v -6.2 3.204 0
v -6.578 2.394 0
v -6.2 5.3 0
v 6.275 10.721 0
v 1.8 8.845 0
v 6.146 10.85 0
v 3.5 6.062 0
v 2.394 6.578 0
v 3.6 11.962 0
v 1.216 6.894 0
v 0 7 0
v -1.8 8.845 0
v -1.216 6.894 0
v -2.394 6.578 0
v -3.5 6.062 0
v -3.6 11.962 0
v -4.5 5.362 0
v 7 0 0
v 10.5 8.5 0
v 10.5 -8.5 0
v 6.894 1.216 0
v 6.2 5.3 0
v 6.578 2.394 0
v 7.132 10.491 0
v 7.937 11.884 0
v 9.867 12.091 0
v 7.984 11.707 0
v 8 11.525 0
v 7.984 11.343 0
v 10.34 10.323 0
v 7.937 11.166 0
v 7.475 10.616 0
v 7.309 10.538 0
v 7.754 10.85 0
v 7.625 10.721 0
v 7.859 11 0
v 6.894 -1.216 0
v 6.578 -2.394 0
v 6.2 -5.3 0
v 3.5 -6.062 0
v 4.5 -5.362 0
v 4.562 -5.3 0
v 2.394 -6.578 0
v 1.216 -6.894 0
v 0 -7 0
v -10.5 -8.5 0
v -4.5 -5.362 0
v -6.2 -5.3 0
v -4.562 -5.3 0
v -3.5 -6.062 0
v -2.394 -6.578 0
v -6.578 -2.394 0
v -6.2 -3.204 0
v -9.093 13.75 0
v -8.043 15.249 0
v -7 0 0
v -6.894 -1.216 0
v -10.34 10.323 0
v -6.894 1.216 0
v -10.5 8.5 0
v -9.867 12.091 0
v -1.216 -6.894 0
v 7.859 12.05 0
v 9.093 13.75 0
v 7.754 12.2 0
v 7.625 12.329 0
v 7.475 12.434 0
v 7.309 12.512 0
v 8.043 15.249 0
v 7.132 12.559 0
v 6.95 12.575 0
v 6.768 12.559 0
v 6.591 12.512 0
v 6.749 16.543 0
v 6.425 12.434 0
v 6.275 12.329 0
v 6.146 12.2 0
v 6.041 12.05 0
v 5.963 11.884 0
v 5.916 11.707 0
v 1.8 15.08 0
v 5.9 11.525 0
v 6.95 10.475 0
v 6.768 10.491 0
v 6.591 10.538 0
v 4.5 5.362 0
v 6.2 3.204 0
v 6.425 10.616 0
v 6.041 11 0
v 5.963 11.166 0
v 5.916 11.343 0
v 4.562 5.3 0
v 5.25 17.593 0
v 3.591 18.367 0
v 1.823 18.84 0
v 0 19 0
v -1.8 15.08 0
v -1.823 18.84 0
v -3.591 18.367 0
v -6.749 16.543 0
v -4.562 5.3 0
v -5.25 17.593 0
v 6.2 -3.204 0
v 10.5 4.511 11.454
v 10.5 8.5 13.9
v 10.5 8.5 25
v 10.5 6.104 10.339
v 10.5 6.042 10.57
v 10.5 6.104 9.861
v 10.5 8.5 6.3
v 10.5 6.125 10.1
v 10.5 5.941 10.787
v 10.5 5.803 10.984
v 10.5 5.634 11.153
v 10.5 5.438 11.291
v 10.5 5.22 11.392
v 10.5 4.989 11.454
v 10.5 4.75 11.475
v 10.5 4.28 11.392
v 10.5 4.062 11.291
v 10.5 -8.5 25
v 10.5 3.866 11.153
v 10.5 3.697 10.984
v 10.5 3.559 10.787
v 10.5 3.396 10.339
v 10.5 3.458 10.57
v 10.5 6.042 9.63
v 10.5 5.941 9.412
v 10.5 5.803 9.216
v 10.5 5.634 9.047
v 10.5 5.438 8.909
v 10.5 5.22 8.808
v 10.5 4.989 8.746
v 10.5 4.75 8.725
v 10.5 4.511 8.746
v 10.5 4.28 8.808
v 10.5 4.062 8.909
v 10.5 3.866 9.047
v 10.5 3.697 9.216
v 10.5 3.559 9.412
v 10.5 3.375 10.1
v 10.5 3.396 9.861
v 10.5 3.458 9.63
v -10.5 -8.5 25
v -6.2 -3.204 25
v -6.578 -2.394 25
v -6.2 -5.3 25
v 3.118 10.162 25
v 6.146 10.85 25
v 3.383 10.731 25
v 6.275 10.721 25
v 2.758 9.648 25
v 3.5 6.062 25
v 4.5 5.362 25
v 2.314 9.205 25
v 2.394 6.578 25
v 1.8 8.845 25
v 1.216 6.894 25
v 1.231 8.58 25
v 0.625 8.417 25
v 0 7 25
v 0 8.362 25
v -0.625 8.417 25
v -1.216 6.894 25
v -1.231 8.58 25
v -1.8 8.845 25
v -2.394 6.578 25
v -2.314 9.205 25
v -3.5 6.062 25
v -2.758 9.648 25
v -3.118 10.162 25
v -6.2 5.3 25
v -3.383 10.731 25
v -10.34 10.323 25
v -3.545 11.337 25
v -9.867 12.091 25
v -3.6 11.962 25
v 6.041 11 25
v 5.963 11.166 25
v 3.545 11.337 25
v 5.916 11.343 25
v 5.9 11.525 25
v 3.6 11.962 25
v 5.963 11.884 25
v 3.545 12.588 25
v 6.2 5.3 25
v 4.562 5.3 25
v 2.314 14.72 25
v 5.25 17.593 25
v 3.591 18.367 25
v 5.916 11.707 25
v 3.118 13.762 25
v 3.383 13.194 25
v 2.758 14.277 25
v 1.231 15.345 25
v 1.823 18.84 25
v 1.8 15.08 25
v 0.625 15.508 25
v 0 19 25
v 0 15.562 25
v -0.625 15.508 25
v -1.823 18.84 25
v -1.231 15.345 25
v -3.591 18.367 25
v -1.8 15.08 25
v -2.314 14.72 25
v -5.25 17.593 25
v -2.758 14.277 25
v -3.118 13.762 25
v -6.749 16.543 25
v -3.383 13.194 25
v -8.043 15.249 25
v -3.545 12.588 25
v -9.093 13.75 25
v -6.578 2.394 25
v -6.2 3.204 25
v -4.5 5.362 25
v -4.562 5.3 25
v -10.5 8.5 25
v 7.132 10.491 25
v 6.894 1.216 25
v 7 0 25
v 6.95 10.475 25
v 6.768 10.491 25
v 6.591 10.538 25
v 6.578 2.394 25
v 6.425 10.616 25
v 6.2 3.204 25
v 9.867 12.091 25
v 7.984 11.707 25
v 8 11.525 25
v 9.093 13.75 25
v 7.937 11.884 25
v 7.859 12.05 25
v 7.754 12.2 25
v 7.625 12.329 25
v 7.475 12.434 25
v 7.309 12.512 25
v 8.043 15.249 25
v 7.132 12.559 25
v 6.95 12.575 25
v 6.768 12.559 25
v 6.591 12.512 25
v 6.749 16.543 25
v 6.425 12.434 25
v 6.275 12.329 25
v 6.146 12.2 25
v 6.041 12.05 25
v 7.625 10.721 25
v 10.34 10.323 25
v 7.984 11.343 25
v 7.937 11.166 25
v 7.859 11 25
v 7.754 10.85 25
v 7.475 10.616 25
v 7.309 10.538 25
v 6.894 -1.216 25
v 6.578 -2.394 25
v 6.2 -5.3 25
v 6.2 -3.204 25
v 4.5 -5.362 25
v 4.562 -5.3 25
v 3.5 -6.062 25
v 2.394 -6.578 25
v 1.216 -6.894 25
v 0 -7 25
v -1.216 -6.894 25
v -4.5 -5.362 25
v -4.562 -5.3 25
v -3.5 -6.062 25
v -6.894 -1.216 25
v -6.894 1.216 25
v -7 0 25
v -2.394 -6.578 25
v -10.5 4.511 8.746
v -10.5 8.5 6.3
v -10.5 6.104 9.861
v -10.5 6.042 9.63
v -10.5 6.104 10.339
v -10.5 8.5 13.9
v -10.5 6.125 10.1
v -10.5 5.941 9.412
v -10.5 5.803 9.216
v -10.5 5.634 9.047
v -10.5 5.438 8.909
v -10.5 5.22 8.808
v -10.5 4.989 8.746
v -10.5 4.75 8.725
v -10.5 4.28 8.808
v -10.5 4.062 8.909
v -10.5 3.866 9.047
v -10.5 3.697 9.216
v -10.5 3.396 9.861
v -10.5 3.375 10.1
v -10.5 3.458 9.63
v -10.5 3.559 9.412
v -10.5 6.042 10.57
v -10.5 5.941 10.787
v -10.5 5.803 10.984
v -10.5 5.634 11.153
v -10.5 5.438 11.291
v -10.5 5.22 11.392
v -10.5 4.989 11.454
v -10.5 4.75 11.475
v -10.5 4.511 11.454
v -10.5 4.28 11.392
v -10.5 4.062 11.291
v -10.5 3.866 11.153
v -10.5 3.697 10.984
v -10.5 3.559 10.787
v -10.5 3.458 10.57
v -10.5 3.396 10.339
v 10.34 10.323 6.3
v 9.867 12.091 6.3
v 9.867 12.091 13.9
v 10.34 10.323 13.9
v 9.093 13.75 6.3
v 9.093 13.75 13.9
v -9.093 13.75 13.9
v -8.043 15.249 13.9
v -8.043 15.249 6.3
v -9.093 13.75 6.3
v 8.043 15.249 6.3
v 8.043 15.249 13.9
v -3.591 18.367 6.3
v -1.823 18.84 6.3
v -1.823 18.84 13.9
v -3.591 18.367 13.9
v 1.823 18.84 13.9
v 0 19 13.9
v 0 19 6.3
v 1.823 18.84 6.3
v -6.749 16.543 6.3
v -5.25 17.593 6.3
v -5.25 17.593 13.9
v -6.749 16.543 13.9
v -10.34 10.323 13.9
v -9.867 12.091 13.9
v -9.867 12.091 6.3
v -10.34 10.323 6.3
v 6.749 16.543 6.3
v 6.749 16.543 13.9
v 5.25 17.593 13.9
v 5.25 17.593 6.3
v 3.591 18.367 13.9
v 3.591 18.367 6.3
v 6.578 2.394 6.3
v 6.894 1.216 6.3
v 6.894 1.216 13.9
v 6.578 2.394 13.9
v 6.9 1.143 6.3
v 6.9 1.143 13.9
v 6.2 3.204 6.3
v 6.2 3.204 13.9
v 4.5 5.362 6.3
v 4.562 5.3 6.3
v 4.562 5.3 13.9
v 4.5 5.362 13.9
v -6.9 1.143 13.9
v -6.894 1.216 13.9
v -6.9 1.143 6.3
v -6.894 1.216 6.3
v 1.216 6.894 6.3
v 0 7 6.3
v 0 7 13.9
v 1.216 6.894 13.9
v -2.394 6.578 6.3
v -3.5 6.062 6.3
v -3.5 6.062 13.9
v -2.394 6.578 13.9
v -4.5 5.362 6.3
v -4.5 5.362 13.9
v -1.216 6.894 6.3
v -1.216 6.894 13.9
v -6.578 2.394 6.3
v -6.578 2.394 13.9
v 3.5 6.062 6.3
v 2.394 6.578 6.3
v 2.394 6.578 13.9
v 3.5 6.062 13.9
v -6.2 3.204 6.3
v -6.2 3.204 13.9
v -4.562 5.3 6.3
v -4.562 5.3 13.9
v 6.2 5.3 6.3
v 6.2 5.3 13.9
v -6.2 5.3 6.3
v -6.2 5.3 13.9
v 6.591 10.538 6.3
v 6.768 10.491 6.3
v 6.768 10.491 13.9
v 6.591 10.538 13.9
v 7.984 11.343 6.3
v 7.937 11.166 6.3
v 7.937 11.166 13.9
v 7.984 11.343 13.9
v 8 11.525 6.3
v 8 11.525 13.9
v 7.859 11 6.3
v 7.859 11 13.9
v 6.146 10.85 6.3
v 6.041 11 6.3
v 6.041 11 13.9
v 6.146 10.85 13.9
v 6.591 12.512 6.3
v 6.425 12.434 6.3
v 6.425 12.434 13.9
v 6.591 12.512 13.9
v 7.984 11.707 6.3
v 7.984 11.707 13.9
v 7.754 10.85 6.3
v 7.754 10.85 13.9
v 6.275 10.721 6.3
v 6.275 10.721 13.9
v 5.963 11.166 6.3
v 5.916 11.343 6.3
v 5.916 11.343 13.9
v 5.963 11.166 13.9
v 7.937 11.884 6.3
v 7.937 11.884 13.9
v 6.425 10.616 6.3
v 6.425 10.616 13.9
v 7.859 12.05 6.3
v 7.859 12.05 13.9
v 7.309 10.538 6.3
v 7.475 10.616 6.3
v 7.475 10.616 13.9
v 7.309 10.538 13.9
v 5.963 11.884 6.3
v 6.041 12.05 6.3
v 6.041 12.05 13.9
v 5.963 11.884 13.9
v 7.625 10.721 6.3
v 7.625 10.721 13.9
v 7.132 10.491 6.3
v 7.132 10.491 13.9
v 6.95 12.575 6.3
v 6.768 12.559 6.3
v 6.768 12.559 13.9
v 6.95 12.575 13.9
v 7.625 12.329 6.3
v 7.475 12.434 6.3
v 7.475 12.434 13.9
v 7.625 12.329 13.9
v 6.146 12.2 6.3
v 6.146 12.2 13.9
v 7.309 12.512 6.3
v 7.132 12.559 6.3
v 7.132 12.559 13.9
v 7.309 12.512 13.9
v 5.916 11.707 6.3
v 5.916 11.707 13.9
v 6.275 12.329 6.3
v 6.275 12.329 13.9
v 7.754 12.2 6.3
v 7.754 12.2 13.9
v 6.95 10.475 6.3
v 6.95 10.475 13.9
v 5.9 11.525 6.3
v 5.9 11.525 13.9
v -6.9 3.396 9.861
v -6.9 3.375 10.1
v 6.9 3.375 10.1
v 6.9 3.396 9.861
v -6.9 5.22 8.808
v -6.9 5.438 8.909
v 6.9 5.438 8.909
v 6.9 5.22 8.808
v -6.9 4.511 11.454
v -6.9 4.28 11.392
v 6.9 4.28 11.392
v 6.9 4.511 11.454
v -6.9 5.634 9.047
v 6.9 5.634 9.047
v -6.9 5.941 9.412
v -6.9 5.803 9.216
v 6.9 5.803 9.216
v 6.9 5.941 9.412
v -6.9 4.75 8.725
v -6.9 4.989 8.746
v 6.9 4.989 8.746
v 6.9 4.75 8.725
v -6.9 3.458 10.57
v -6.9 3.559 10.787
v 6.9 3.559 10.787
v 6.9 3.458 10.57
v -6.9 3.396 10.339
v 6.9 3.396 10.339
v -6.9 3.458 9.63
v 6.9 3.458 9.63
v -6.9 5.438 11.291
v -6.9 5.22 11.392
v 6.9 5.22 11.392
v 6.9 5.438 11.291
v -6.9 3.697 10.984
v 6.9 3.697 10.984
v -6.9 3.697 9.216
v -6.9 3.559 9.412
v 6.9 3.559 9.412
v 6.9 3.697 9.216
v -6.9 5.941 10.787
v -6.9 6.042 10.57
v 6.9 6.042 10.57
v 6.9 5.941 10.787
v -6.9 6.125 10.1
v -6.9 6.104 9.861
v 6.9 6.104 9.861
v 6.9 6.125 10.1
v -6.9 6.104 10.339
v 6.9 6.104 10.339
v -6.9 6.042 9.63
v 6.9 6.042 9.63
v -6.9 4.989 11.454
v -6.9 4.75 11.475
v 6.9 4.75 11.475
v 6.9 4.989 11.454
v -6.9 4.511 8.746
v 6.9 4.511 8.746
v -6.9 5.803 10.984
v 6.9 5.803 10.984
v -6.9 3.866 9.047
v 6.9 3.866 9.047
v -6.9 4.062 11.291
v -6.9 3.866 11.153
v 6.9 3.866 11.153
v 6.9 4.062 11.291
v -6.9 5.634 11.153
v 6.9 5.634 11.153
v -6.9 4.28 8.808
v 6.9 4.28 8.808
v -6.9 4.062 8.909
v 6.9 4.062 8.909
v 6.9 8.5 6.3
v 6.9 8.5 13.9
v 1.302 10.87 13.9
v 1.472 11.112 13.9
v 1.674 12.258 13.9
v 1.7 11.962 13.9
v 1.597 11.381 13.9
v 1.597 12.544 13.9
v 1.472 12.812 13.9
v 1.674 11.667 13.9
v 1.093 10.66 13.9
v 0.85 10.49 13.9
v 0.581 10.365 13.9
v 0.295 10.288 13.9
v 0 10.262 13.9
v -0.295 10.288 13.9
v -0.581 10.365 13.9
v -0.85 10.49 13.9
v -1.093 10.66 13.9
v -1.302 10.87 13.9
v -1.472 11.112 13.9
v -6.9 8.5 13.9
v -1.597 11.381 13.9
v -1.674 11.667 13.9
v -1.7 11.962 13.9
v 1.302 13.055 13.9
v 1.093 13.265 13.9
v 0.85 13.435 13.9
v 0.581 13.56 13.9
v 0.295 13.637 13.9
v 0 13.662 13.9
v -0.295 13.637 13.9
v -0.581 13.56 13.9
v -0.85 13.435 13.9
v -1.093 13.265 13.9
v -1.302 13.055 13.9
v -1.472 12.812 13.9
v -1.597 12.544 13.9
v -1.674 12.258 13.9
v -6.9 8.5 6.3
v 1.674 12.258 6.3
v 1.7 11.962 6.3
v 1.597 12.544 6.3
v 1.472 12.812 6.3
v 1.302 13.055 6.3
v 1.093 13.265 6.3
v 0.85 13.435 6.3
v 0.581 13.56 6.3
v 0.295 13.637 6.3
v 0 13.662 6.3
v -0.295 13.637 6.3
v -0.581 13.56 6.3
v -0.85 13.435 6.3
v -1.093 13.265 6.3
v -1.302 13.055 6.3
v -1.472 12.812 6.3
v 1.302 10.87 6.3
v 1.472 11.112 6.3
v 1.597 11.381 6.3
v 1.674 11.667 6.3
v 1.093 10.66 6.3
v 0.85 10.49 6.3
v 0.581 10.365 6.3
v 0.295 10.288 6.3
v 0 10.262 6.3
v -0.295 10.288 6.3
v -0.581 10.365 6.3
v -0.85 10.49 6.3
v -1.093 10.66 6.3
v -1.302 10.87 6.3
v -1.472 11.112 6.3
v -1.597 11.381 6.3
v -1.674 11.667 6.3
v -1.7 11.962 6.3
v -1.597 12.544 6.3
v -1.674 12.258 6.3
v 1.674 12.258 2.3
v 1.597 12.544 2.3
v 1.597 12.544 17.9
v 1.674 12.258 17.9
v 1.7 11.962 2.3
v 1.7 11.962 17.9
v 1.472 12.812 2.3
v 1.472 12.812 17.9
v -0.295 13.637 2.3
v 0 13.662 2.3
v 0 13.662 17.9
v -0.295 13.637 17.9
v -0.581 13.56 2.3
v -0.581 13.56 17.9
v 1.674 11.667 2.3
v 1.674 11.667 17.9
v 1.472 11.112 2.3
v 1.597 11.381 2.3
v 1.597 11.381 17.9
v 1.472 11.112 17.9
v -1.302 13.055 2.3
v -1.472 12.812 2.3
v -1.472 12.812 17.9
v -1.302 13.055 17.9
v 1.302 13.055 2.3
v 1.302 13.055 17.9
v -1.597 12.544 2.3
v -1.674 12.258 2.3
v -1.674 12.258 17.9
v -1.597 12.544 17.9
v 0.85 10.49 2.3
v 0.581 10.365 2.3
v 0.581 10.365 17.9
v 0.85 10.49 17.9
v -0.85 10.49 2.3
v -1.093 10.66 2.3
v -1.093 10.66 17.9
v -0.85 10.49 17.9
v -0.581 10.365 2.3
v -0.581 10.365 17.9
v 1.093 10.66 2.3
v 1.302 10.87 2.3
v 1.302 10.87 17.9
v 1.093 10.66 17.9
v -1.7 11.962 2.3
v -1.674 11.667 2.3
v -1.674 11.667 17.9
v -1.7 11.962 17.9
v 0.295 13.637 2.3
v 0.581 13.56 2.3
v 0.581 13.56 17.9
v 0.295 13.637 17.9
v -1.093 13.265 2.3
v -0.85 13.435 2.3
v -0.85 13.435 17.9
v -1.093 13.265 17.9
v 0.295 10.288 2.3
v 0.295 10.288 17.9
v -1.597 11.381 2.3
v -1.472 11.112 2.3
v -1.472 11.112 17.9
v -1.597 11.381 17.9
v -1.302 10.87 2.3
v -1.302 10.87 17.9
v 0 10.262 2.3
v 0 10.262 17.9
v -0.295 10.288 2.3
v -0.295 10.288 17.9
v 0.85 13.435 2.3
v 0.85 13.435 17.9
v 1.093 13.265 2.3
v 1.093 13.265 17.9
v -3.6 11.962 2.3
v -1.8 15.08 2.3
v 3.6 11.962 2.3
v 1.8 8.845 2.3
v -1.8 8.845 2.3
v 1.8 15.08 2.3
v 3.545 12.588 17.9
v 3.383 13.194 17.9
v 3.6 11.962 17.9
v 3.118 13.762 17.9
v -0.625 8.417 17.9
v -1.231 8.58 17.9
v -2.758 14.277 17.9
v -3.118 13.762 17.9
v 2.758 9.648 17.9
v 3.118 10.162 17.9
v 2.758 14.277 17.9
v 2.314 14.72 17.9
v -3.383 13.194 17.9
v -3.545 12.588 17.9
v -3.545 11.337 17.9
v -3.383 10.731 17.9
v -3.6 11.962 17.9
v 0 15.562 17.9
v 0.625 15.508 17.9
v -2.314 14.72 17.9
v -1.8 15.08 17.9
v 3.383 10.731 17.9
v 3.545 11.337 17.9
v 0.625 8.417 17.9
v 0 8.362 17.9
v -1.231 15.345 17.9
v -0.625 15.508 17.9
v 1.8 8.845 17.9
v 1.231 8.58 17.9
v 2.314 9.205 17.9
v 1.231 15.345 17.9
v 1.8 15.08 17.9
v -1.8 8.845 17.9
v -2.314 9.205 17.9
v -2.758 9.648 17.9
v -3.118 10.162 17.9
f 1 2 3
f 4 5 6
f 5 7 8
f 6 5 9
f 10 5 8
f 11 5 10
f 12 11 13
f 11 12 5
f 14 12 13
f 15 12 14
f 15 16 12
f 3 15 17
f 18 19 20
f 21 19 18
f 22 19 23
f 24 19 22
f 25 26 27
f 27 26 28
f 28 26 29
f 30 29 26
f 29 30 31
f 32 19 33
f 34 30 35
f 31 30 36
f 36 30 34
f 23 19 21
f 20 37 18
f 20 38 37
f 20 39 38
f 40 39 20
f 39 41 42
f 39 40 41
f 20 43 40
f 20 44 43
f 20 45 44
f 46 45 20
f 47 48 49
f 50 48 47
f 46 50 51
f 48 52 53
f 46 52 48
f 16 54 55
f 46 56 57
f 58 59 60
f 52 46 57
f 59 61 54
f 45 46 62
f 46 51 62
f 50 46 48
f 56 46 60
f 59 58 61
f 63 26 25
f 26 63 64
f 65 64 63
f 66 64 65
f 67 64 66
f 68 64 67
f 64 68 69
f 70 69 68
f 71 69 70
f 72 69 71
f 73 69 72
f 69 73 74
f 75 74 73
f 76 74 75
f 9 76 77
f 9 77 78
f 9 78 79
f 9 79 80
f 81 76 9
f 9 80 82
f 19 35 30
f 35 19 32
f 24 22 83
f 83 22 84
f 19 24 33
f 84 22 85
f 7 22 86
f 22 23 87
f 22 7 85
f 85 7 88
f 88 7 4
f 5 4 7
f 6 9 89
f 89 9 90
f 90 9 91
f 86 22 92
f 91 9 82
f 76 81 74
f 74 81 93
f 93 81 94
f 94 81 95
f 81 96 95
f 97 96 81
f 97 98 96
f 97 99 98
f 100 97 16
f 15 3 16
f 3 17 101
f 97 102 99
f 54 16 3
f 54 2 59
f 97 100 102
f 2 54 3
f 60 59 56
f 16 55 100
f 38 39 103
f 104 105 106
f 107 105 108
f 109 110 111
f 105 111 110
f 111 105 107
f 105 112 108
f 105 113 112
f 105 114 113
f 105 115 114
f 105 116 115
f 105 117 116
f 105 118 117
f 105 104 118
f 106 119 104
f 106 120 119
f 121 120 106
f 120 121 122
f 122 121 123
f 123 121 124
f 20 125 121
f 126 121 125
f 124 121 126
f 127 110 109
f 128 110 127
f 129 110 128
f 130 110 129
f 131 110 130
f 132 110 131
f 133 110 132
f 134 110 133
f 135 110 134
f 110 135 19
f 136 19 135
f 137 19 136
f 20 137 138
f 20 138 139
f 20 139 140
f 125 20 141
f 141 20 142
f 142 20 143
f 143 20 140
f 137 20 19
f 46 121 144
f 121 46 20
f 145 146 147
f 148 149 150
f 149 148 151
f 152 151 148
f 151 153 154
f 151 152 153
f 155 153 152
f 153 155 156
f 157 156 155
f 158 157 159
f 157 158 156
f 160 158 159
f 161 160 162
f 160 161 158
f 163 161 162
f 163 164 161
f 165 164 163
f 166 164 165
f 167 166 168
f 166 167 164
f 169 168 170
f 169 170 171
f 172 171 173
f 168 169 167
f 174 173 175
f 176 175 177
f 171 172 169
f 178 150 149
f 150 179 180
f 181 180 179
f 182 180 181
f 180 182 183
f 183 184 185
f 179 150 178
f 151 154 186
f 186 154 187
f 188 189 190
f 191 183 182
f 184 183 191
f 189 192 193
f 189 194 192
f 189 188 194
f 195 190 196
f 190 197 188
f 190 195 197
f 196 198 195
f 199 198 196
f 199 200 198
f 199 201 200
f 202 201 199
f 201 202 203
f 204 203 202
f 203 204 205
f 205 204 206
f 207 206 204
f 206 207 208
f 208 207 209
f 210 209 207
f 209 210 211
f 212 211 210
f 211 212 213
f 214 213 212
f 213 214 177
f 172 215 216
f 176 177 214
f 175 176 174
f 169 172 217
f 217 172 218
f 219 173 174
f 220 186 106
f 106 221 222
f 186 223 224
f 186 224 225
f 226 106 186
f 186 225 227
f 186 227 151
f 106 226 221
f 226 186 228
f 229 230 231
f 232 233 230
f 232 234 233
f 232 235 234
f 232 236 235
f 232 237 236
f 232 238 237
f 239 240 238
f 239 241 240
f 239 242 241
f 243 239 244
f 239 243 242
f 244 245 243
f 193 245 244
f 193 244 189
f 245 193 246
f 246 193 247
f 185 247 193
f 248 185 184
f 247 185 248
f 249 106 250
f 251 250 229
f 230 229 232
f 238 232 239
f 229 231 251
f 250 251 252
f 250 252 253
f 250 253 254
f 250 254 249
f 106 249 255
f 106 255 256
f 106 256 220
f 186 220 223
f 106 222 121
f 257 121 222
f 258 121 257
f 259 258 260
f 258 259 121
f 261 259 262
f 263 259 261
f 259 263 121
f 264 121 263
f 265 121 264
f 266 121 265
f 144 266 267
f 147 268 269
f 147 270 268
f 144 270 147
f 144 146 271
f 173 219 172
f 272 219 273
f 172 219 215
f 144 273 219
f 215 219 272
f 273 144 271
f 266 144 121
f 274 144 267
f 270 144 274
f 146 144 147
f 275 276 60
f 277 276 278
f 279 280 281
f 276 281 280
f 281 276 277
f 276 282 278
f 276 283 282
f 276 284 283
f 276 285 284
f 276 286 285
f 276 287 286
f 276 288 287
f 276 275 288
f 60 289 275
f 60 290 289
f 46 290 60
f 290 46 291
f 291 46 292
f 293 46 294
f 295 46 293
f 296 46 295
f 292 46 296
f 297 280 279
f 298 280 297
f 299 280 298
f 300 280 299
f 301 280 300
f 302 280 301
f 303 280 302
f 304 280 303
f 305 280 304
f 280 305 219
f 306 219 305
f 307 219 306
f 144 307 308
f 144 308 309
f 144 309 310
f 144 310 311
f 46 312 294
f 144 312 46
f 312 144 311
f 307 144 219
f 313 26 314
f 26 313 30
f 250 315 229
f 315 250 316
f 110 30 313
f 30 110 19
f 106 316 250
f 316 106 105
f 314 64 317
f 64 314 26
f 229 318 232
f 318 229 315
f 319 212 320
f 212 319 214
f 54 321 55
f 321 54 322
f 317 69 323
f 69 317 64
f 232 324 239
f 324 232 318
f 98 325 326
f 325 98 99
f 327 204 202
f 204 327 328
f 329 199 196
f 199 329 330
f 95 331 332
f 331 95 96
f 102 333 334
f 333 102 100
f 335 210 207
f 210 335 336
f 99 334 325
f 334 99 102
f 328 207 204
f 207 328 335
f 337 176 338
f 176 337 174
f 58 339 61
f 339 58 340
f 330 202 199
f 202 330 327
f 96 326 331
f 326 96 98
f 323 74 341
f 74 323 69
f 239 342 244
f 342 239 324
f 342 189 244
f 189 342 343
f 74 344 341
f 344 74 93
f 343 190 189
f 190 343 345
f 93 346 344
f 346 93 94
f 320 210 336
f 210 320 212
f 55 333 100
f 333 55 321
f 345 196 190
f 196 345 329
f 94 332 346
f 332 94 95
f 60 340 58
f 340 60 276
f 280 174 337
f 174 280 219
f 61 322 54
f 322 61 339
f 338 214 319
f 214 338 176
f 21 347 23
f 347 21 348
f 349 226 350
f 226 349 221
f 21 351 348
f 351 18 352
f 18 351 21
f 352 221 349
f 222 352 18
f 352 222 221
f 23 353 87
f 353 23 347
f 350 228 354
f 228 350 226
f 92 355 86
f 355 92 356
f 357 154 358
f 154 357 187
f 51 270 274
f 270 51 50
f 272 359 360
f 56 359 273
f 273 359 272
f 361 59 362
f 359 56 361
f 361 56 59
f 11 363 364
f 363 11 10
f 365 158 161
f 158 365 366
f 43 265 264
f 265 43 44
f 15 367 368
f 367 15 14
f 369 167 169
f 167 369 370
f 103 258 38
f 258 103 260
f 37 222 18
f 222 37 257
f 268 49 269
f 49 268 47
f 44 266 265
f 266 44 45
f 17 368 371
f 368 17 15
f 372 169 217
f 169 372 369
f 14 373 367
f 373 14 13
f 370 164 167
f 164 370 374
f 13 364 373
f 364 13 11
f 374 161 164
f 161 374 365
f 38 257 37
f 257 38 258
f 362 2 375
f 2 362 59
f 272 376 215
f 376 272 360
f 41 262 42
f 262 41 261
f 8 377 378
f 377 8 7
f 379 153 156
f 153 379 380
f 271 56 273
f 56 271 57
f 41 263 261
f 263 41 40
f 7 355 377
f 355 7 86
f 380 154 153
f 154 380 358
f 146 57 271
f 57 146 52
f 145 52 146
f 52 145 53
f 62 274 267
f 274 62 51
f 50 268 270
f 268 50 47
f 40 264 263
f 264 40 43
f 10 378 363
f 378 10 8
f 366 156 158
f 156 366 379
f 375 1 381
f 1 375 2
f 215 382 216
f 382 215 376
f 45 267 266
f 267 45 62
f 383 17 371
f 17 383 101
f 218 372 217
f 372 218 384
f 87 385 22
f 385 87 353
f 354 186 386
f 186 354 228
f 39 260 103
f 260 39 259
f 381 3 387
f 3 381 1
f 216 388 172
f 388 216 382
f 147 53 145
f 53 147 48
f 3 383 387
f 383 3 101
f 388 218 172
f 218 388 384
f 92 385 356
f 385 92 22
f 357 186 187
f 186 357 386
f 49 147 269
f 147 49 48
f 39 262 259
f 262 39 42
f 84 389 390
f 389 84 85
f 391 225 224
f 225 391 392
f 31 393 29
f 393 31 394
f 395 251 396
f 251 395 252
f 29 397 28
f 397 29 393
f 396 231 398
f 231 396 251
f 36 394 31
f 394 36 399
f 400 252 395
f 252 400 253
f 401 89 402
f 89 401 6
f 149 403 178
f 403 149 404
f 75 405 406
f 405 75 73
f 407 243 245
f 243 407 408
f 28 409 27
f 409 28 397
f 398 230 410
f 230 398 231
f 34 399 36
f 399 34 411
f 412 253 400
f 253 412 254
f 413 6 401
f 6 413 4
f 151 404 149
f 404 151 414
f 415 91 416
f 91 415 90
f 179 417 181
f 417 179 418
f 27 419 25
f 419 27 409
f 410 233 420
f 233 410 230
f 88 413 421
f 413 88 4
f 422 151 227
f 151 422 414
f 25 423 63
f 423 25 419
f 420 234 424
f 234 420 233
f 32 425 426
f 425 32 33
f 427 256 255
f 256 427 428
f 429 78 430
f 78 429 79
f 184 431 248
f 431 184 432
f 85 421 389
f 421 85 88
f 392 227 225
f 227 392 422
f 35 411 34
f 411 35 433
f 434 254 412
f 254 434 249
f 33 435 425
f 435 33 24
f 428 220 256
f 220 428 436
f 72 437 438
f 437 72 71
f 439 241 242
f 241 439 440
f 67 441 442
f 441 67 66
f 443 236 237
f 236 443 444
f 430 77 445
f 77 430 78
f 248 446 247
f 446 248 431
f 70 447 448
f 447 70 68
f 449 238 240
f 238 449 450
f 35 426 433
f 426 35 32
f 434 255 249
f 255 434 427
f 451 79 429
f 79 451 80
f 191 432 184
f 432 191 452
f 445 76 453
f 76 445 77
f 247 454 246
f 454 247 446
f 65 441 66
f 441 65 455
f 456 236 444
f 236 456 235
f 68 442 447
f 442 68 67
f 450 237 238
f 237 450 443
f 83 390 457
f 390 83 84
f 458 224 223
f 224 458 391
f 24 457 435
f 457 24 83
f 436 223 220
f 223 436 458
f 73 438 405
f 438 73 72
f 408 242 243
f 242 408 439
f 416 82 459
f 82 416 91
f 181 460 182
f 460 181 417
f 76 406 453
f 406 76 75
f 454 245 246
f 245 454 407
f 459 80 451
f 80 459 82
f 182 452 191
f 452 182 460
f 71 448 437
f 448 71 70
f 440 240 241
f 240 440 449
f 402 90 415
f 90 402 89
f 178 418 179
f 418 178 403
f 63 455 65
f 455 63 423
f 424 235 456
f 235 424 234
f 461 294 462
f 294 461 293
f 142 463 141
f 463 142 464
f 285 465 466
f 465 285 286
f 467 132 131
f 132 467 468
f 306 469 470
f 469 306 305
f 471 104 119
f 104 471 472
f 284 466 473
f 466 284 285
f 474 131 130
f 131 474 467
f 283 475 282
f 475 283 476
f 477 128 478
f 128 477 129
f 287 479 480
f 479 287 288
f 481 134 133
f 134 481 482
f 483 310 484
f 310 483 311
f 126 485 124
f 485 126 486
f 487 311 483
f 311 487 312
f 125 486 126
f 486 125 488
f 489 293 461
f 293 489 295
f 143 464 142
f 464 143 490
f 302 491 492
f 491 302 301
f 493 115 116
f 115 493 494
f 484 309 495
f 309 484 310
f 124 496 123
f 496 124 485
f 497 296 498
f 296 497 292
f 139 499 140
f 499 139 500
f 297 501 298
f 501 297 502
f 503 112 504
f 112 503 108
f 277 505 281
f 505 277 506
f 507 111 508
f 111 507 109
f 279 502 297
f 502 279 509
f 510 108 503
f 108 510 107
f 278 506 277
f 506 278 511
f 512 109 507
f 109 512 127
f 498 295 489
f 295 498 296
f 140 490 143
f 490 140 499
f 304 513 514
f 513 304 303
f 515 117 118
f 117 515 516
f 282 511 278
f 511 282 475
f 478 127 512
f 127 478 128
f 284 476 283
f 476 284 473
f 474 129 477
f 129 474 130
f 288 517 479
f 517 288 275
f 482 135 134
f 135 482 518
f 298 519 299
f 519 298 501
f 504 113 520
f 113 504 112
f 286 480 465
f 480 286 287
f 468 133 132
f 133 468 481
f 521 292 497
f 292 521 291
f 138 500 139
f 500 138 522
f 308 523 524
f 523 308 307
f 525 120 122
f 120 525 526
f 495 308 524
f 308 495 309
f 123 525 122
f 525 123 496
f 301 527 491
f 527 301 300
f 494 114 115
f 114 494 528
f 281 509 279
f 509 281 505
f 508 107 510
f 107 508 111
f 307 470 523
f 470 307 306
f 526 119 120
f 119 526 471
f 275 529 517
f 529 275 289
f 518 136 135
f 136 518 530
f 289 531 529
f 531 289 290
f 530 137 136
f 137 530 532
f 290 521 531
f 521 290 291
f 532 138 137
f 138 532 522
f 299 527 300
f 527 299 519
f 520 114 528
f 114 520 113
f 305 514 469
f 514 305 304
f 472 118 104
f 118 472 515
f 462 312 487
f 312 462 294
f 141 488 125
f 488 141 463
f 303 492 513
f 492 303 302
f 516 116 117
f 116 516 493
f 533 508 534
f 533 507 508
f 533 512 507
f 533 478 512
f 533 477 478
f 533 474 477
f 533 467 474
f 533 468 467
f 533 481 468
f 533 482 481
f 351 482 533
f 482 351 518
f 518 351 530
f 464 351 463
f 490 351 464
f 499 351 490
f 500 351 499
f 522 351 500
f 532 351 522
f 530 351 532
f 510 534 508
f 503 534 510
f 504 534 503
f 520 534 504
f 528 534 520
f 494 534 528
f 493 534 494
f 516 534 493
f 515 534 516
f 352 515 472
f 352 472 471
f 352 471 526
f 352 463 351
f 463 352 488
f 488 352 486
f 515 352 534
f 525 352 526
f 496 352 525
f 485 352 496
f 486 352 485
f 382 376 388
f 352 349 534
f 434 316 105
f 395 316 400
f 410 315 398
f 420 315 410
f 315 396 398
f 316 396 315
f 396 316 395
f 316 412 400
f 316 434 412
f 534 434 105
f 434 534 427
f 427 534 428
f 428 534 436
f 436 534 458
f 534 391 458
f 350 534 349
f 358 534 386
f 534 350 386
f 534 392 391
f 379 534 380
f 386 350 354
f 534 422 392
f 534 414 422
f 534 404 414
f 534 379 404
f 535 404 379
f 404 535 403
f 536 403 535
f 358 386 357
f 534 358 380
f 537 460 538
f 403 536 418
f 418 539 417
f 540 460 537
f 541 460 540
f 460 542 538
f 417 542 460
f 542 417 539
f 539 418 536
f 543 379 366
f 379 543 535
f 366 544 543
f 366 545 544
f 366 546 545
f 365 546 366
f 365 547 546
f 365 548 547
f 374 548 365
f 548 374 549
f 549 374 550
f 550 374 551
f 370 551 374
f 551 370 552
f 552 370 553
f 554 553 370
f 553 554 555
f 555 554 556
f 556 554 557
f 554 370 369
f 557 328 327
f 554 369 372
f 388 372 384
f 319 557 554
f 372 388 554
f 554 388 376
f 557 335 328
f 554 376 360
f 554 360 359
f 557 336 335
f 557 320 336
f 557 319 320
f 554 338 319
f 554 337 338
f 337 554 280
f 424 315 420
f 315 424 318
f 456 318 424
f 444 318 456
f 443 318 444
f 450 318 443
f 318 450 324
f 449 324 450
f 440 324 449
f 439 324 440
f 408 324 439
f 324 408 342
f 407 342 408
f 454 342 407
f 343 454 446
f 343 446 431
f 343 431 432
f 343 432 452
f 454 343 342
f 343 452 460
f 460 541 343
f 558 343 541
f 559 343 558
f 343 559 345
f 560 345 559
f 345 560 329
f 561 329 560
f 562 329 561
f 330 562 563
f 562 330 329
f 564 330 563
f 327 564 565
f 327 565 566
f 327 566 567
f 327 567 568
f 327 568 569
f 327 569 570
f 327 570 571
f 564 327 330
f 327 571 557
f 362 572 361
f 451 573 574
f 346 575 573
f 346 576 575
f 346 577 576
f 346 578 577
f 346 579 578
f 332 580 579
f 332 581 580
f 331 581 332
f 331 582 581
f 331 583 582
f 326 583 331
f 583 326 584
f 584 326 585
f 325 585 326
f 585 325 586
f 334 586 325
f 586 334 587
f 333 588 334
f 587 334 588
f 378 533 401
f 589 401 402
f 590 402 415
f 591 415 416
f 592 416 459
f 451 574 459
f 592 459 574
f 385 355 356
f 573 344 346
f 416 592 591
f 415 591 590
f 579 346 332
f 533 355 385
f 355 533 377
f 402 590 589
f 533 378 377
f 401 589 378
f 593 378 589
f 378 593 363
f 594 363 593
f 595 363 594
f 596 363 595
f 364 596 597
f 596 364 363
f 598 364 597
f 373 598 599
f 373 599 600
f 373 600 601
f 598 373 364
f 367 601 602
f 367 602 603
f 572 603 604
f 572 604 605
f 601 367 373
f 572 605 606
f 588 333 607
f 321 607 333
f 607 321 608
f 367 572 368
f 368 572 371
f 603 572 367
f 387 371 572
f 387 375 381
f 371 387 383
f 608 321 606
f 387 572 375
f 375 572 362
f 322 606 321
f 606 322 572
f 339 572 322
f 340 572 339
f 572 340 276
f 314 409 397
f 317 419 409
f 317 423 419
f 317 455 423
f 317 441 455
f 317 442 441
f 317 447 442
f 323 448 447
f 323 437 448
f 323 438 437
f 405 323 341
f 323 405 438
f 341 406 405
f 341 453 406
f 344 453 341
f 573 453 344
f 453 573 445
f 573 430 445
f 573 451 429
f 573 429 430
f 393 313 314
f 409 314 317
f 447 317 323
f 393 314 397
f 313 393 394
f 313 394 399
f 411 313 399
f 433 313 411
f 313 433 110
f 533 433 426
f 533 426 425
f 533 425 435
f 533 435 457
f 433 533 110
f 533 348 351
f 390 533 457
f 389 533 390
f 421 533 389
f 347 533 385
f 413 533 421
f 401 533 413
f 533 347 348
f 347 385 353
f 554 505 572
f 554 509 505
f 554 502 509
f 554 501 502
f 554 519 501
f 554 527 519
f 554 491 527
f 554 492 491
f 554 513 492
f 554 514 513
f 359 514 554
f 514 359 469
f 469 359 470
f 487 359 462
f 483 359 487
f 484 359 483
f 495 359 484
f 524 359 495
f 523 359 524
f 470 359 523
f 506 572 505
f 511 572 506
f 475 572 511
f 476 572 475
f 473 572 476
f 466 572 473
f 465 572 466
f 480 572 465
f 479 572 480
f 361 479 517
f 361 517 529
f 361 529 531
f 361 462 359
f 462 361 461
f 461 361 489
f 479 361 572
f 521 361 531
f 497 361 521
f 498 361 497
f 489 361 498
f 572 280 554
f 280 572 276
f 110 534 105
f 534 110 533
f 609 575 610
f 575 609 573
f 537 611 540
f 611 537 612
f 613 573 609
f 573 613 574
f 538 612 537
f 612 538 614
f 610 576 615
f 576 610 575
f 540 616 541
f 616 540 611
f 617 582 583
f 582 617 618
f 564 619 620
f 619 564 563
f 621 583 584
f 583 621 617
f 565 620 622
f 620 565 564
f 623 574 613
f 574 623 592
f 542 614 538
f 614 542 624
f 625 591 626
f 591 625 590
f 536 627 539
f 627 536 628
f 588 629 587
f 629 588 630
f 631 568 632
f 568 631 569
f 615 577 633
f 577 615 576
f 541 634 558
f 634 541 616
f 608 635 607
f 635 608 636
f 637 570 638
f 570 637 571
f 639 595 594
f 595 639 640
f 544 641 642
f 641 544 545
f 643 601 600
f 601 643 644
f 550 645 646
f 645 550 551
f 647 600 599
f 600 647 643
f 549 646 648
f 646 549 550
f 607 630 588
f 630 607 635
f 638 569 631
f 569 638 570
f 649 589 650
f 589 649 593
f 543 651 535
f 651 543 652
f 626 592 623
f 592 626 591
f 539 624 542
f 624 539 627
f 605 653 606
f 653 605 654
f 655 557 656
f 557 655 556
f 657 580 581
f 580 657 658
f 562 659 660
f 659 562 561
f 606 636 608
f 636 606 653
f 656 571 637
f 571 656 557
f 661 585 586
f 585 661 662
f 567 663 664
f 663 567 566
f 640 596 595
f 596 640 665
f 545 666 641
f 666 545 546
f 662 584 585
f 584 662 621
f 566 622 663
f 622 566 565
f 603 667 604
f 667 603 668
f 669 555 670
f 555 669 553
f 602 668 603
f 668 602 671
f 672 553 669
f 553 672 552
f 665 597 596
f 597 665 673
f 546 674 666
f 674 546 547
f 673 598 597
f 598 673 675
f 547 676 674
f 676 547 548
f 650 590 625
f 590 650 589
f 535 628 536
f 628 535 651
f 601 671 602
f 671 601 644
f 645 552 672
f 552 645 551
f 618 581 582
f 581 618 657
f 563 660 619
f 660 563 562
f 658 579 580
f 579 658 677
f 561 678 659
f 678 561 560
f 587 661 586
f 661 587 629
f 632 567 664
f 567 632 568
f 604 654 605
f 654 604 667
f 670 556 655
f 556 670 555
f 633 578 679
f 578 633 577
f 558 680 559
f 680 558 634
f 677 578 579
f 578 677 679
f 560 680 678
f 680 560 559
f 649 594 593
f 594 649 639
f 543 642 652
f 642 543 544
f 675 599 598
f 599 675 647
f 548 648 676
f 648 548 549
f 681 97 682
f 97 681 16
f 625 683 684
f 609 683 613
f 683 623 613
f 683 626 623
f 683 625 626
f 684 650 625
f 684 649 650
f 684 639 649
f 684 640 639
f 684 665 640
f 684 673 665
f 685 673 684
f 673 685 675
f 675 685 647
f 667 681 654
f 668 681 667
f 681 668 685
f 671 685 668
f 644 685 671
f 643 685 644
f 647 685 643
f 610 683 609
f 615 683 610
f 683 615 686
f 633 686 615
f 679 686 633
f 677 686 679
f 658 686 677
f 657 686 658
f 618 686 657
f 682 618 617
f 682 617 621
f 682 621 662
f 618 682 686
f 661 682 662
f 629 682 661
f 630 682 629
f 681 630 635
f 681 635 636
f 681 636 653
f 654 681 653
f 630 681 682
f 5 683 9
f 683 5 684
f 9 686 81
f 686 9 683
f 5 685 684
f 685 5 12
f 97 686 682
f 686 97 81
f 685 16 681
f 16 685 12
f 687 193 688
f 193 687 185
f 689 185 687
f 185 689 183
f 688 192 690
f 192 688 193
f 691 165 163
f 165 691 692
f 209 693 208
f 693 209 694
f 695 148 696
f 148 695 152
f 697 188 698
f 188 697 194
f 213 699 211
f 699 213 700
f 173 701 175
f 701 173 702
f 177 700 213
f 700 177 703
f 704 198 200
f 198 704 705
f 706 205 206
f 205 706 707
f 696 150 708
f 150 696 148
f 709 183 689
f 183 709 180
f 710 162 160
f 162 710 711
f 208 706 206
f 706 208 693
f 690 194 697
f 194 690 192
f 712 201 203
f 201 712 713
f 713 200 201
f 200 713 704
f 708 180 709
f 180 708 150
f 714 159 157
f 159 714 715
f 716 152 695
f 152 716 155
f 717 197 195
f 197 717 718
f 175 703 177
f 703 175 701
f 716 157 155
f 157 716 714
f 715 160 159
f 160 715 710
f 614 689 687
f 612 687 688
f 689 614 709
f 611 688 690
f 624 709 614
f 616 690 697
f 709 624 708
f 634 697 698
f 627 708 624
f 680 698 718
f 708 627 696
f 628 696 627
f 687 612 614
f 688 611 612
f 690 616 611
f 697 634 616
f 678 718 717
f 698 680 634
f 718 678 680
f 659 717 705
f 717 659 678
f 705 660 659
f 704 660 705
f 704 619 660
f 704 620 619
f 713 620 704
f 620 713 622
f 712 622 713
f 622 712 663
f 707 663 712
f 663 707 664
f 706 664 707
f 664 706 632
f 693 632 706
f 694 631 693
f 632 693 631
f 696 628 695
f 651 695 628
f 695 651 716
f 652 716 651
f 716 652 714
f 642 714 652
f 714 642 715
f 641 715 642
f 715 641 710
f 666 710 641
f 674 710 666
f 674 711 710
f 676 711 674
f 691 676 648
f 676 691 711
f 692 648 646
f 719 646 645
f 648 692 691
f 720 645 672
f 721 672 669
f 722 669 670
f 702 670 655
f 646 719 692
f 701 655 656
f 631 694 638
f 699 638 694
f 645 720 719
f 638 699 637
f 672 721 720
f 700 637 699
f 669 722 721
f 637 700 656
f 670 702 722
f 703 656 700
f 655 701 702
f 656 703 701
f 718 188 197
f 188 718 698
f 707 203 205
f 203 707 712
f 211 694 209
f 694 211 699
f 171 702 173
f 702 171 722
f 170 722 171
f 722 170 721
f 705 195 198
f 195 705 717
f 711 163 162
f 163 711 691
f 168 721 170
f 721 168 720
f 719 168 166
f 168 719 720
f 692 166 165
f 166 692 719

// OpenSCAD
$fn = 36;
/* VARIABLES */
{
bearingDia = 9.8;
screwHeadDia = 5.9;
screwHeadDepth = 4;
magnetDia = 6;
magnetDepth = 0.8;
tollerance = 0.3;

motorCoverLength = 3;
transmissionCoverLength = 9;
transmissionWidth = 12.4;
transmissionHeight = 10.6;
mainBodyWidth = 21;
mainBodyDepth = 17;
bodyCornerRound = 0;
motorDiameter = 12.8;
motorFix = 10.2;
gearCoverLength = 25;
gearHousingDiameter = 14;
gearDiameter = 11;
gearLength = 14;
gearTeethLength = 7.8;
gearBite = 0.75;
filamentWidth = 1.75;
bearingOD = 11.8;
bearingID = 6;
bearingHeight = 3.8;
screwLength = 20;
screwDia = 3.4;

encShaftLength = 35.2;
encShaftDia = 2.1;

bearingMiddle = gearLength - gearTeethLength / 2;
}
/* ACTUAL PART */

    *magnetHolder();
    *encoderWheel();
    bodyPart();
    *bodySupport();
    // bearing fillers
    translate([
        0, 
        gearDiameter / 2  + bearingOD / 2 + filamentWidth / 2 - gearBite,
        motorCoverLength + transmissionCoverLength + gearLength - gearTeethLength / 2
    ]) {
        translate([0, 0, -bearingHeight / 2])
            bearingFillFull();
        *translate([0, 0, bearingHeight / 2]) rotate([0, 180, 0])
            bearingFill();
    }
    
    *ballBearingDraw();
    
/* MODULES */
module ballBearingDraw() {
    translate([
        0, 
        gearDiameter / 2  + bearingOD / 2 + filamentWidth / 2 - gearBite,
        motorCoverLength + transmissionCoverLength + gearLength - gearTeethLength / 2
    ]) ballBearing();
}
module bodyPart() {
    motorEnclosure();
    translate([0, 0, motorCoverLength])
        transmissionEnclosure();
    translate([0, 0, motorCoverLength + transmissionCoverLength])
        !gearEnclosure();
}
module motorEnclosure() {
    difference() {
        translate([0,0, motorCoverLength / 2])
            roundedCube(
                [mainBodyWidth, mainBodyDepth, motorCoverLength],
                bodyCornerRound
            );
        // motor sized cylinder
        translate([0,0,motorCoverLength / 2]) color([1,1,1])
            cylinder(r = motorDiameter / 2, h=motorCoverLength + 1,
                center = true);
    }
    // motor shape adjustment
    translate([
        0,
        motorFix / 2 + (motorDiameter - motorFix) / 4,
        motorCoverLength / 2]
    )
        cube(
            [motorDiameter,
            (motorDiameter - motorFix) / 2,
            motorCoverLength],
            center = true
        );
    translate([
        0,
        - motorFix / 2 - (motorDiameter - motorFix) / 4,
        motorCoverLength / 2]
    )
        cube(
            [motorDiameter,
            (motorDiameter - motorFix) / 2,
            motorCoverLength],
            center = true
        );
}
module transmissionEnclosure() {
    difference() {
        union() {
            translate([0,0, transmissionCoverLength / 2])
                roundedCube(
                    [mainBodyWidth,
                    mainBodyDepth,
                    transmissionCoverLength],
                    bodyCornerRound);
            translate([0, mainBodyDepth / 2, 0]) 
                cylinder(r = mainBodyWidth/ 2, h = transmissionCoverLength, center = false);
        }
        translate([0,0, transmissionCoverLength / 2])
            color([1,1,1])
                cube([transmissionWidth,transmissionHeight, transmissionCoverLength + 1], center = true);    
        translate([0, gearDiameter / 2  + bearingOD / 2 + filamentWidth * 3 / 4 - gearBite,  transmissionCoverLength / 2])
            cylinder(r = screwDia + .2, h = transmissionCoverLength + 1, center = true, $fn = 6);

    }


}


module gearEnclosure() {
    color([1, 1, 1]) {
    difference() {
        union() {
            translate([0, 0, gearCoverLength / 2])
            roundedCube(
                [mainBodyWidth,
                mainBodyDepth,
                gearCoverLength],
                bodyCornerRound);
                translate([0, mainBodyDepth / 2, gearCoverLength / 2]) 
                    cylinder(r = mainBodyWidth/ 2, h = gearCoverLength, center = true);
                    //cylinder(r = mainBodyDepth * .75 / 2, h = gearCoverLength, center = true);
        }
        // inner hole for transmission and gear
        translate([0, 0, gearCoverLength / 2]) {
            cylinder(
                r = gearHousingDiameter / 2, 
                h = gearCoverLength + 1, 
                center = true
            );
            cube([transmissionWidth, transmissionHeight, gearCoverLength + 1], center = true);
        }
        filamentTube();
        // cutout for ball bearing
        translate([0, gearDiameter, bearingMiddle]) 
            cube([bearingOD + 2, bearingOD + 10, bearingHeight * 2], center = true);
        translate([0, mainBodyDepth, bearingMiddle]) 
            cube([mainBodyWidth, mainBodyDepth, bearingHeight * 2], center = true);

        // screw hole
        translate([0, gearDiameter / 2  + bearingOD / 2 + filamentWidth * 3 / 4 - gearBite, gearCoverLength / 2])
        cylinder(r = screwDia / 2, h = gearCoverLength, center = true);
        // nut hole
        translate([0, gearDiameter / 2  + bearingOD / 2 + filamentWidth * 3 / 4 - gearBite,  gearLength - gearTeethLength / 2 - bearingHeight - 4])
        rotate([0,180,0])
        cylinder(r = screwDia + .2, h = gearCoverLength, center = false, $fn = 6);
        // screw head hole
        translate([0, gearDiameter / 2  + bearingOD / 2 + filamentWidth * 3 / 4 - gearBite,  gearLength - gearTeethLength / 2 + bearingHeight + 4])
        cylinder(r = screwDia + .2, h = gearCoverLength, center = false);
        
        // encoder shaft
        translate([
            0, 
            gearDiameter / 2  + bearingOD / 2 + filamentWidth / 2 - gearBite,
            encShaftLength - 1
        ])
        translate([bearingOD / 2 + encShaftDia / 2, 0, 0]) rotate([180, 0, 0]) encoder();
    }

    }
}

module filamentTube() {
    translate([
        0, 
        gearDiameter / 2 - gearBite, 
        gearLength - gearTeethLength / 2
    ])
        rotate([0, 90, 0])
        color([1, 1, 1])
    cylinder(
        r = filamentWidth / 2 + 0.5,
        h = mainBodyWidth + 1,
        center = true
    );
}
module roundedCube(size, radius) {
	x = size[0];
	y = size[1];
	z = size[2];
    
    translate([0, 0, -z / 2])
	linear_extrude(height=z)
	{
		// place 4 circles in the corners, with the given radius
		translate([(-x/2)+(radius), (-y/2)+(radius), 0])
            circle(r=radius);
		translate([(x/2)-(radius), (-y/2)+(radius), 0])
            circle(r=radius);
		translate([(-x/2)+(radius), (y/2)-(radius), 0])
            circle(r=radius);
		translate([(x/2)-(radius), (y/2)-(radius), 0])
            circle(r=radius);
            square([x - 2 * radius, y], center = true);
            square([x, y - 2 * radius], center = true);
	}
}
module ballBearing() {
        difference() {
            cylinder(r = bearingOD / 2, h = bearingHeight, center = true);
            cylinder(r = bearingID / 2, h = bearingHeight + 1, center = true);
        }
}
module screw() {
    cylinder(r = screwDia / 2, h = screwLength, center = true);
    translate([0, 0, screwLength / 2 + screwDia / 4])
        cylinder(r = screwDia, h = screwDia / 2, center = true);
}
module nut() {
    difference() {
        cylinder(r = screwDia, h = screwDia * 0.8, center = true, $fn = 6);
        cylinder(r = screwDia / 2, h = screwDia * 0.8 + 1, center = true);
    }
}
module nutHole() {
    cylinder(r = screwDia / 2 + .4, h = mainBodyWidth * 2, center = true);
    translate([screwDia * 3.8, 0, -gearHousingDiameter / 2 + screwDia])
        cube([ screwDia * 10, screwDia * 11 / 6 + 1, 0.8 * screwDia], center = true);
}
module motorAssembly() {
    motorSize = 15.3;
    difference() {
        cylinder(r = motorDiameter / 2, h = motorSize, center = true);
        translate([0, motorDiameter / 2, 0])
        cube([motorDiameter, (motorDiameter - motorFix), 16], center = true);
        translate([0, -motorDiameter / 2, 0])
        cube([motorDiameter, (motorDiameter - motorFix), 16], center = true);
    }
    translate([0, 0, motorSize / 2 + transmissionCoverLength / 2])
    cube([transmissionWidth, transmissionHeight, transmissionCoverLength], center = true);

    translate([0, 0, motorSize / 2 + transmissionCoverLength + gearLength / 2]) {
        cylinder(r = gearDiameter / 2 - 1.5, h = gearLength - 5, center = true);
        translate([0, 0, gearLength / 2 - gearTeethLength / 2])
        cylinder(r = gearDiameter / 2, h = gearTeethLength, center = true);
        cylinder(r = 1.5, h = gearLength, center = true);
    }
}
module bearingFill() {
    color([1, 0, 0])
    translate([0, 0, -bearingHeight * .25])
    difference() {
        union() {
        translate([0,0,bearingHeight * .45])
            cylinder(r = bearingID / 2, h = bearingHeight * .4, center = true);
        cylinder(r = bearingID / 2 + 1, h = bearingHeight * .5, center = true);
        }
        cylinder(r = screwDia / 2 + .2, h = bearingHeight * 2, center = true);
    }
}
module bearingFillFull() {
    color([1, 0, 0])
    translate([0, 0, -bearingHeight * .25])
    difference() {
        union() {
        translate([0,0,bearingHeight * .45])
            cylinder(r = bearingID / 2, h = bearingHeight, center = true);
        cylinder(r = bearingID / 2 + 1, h = bearingHeight * .5, center = true);
        }
        cylinder(r = screwDia / 2 + .2, h = bearingHeight * 2, center = true);
    }
}
module bodySupport() {
    translate([
            0, 
            mainBodyDepth / 2,
            motorCoverLength + transmissionCoverLength + gearLength - gearTeethLength / 2
    ]) {
        difference() {
            cylinder(r = mainBodyDepth * .75 / 2, h = bearingHeight * 2, center = true);
            cylinder(r = mainBodyDepth * .75 / 2 - .7, h = bearingHeight * 2 + 1, center = true);
            translate([0, -mainBodyDepth / 2, 0]) cube([mainBodyDepth * .75 + 1, mainBodyDepth, bearingHeight * 2 + 1], center = true);
        }
    }
    translate([
        0, 
        gearDiameter / 2  + bearingOD / 2 + filamentWidth * 3 / 4 - gearBite,
        motorCoverLength + transmissionCoverLength + gearLength - gearTeethLength / 2
    ]) difference() {
        cylinder(r = screwDia / 2 + .8, h = bearingHeight * 2, center = true);
        cylinder(r = screwDia / 2, h = bearingHeight * 2 + 1, center = true);
    }
}

module encoderWheel() {
    color([1, 1, 0]) translate([0,0,.6]) difference() {
        union() {
            linear_extrude(height = 1.2, center = true, convexity = 10) {
            circle(r = 11.5, center = true);
            for(i = [0:6:360 - 6])
                rotate([0,0,i]) polygon([[0,0],[14.325,0],[14.325,1]]);
            }
            translate([0, 0, 2]) cylinder(r = 4, h = 4, center = true);
        }
        cylinder(r = encShaftDia / 2, h=10, center = true);
    }
}
module encoderShaft() {
    color([1,0,0]) translate([0, 0, encShaftLength / 2]) cylinder(r = encShaftDia / 2, h = encShaftLength, center = true);
}

module encoder() {
    encoderShaft();
    encoderWheel();
}

module magnetHolder() {
    difference() {
        cylinder(center = false, r = bearingDia / 2 - tollerance, h = screwHeadDepth + tollerance);
        translate([0, 0, -tollerance])
            cylinder(center = false, r = screwHeadDia / 2 + tollerance, h = screwHeadDepth * 2);
    }

    translate([0, 0, screwHeadDepth + tollerance])
        difference() {
            cylinder(center = false, r = bearingDia / 2 - tollerance, h = screwHeadDepth + tollerance);
            translate([0, 0, screwHeadDepth + tollerance  - magnetDepth])
                cylinder(center = false, r = magnetDia / 2 + tollerance, h = magnetDepth + tollerance);
        }
}

// end of modules
